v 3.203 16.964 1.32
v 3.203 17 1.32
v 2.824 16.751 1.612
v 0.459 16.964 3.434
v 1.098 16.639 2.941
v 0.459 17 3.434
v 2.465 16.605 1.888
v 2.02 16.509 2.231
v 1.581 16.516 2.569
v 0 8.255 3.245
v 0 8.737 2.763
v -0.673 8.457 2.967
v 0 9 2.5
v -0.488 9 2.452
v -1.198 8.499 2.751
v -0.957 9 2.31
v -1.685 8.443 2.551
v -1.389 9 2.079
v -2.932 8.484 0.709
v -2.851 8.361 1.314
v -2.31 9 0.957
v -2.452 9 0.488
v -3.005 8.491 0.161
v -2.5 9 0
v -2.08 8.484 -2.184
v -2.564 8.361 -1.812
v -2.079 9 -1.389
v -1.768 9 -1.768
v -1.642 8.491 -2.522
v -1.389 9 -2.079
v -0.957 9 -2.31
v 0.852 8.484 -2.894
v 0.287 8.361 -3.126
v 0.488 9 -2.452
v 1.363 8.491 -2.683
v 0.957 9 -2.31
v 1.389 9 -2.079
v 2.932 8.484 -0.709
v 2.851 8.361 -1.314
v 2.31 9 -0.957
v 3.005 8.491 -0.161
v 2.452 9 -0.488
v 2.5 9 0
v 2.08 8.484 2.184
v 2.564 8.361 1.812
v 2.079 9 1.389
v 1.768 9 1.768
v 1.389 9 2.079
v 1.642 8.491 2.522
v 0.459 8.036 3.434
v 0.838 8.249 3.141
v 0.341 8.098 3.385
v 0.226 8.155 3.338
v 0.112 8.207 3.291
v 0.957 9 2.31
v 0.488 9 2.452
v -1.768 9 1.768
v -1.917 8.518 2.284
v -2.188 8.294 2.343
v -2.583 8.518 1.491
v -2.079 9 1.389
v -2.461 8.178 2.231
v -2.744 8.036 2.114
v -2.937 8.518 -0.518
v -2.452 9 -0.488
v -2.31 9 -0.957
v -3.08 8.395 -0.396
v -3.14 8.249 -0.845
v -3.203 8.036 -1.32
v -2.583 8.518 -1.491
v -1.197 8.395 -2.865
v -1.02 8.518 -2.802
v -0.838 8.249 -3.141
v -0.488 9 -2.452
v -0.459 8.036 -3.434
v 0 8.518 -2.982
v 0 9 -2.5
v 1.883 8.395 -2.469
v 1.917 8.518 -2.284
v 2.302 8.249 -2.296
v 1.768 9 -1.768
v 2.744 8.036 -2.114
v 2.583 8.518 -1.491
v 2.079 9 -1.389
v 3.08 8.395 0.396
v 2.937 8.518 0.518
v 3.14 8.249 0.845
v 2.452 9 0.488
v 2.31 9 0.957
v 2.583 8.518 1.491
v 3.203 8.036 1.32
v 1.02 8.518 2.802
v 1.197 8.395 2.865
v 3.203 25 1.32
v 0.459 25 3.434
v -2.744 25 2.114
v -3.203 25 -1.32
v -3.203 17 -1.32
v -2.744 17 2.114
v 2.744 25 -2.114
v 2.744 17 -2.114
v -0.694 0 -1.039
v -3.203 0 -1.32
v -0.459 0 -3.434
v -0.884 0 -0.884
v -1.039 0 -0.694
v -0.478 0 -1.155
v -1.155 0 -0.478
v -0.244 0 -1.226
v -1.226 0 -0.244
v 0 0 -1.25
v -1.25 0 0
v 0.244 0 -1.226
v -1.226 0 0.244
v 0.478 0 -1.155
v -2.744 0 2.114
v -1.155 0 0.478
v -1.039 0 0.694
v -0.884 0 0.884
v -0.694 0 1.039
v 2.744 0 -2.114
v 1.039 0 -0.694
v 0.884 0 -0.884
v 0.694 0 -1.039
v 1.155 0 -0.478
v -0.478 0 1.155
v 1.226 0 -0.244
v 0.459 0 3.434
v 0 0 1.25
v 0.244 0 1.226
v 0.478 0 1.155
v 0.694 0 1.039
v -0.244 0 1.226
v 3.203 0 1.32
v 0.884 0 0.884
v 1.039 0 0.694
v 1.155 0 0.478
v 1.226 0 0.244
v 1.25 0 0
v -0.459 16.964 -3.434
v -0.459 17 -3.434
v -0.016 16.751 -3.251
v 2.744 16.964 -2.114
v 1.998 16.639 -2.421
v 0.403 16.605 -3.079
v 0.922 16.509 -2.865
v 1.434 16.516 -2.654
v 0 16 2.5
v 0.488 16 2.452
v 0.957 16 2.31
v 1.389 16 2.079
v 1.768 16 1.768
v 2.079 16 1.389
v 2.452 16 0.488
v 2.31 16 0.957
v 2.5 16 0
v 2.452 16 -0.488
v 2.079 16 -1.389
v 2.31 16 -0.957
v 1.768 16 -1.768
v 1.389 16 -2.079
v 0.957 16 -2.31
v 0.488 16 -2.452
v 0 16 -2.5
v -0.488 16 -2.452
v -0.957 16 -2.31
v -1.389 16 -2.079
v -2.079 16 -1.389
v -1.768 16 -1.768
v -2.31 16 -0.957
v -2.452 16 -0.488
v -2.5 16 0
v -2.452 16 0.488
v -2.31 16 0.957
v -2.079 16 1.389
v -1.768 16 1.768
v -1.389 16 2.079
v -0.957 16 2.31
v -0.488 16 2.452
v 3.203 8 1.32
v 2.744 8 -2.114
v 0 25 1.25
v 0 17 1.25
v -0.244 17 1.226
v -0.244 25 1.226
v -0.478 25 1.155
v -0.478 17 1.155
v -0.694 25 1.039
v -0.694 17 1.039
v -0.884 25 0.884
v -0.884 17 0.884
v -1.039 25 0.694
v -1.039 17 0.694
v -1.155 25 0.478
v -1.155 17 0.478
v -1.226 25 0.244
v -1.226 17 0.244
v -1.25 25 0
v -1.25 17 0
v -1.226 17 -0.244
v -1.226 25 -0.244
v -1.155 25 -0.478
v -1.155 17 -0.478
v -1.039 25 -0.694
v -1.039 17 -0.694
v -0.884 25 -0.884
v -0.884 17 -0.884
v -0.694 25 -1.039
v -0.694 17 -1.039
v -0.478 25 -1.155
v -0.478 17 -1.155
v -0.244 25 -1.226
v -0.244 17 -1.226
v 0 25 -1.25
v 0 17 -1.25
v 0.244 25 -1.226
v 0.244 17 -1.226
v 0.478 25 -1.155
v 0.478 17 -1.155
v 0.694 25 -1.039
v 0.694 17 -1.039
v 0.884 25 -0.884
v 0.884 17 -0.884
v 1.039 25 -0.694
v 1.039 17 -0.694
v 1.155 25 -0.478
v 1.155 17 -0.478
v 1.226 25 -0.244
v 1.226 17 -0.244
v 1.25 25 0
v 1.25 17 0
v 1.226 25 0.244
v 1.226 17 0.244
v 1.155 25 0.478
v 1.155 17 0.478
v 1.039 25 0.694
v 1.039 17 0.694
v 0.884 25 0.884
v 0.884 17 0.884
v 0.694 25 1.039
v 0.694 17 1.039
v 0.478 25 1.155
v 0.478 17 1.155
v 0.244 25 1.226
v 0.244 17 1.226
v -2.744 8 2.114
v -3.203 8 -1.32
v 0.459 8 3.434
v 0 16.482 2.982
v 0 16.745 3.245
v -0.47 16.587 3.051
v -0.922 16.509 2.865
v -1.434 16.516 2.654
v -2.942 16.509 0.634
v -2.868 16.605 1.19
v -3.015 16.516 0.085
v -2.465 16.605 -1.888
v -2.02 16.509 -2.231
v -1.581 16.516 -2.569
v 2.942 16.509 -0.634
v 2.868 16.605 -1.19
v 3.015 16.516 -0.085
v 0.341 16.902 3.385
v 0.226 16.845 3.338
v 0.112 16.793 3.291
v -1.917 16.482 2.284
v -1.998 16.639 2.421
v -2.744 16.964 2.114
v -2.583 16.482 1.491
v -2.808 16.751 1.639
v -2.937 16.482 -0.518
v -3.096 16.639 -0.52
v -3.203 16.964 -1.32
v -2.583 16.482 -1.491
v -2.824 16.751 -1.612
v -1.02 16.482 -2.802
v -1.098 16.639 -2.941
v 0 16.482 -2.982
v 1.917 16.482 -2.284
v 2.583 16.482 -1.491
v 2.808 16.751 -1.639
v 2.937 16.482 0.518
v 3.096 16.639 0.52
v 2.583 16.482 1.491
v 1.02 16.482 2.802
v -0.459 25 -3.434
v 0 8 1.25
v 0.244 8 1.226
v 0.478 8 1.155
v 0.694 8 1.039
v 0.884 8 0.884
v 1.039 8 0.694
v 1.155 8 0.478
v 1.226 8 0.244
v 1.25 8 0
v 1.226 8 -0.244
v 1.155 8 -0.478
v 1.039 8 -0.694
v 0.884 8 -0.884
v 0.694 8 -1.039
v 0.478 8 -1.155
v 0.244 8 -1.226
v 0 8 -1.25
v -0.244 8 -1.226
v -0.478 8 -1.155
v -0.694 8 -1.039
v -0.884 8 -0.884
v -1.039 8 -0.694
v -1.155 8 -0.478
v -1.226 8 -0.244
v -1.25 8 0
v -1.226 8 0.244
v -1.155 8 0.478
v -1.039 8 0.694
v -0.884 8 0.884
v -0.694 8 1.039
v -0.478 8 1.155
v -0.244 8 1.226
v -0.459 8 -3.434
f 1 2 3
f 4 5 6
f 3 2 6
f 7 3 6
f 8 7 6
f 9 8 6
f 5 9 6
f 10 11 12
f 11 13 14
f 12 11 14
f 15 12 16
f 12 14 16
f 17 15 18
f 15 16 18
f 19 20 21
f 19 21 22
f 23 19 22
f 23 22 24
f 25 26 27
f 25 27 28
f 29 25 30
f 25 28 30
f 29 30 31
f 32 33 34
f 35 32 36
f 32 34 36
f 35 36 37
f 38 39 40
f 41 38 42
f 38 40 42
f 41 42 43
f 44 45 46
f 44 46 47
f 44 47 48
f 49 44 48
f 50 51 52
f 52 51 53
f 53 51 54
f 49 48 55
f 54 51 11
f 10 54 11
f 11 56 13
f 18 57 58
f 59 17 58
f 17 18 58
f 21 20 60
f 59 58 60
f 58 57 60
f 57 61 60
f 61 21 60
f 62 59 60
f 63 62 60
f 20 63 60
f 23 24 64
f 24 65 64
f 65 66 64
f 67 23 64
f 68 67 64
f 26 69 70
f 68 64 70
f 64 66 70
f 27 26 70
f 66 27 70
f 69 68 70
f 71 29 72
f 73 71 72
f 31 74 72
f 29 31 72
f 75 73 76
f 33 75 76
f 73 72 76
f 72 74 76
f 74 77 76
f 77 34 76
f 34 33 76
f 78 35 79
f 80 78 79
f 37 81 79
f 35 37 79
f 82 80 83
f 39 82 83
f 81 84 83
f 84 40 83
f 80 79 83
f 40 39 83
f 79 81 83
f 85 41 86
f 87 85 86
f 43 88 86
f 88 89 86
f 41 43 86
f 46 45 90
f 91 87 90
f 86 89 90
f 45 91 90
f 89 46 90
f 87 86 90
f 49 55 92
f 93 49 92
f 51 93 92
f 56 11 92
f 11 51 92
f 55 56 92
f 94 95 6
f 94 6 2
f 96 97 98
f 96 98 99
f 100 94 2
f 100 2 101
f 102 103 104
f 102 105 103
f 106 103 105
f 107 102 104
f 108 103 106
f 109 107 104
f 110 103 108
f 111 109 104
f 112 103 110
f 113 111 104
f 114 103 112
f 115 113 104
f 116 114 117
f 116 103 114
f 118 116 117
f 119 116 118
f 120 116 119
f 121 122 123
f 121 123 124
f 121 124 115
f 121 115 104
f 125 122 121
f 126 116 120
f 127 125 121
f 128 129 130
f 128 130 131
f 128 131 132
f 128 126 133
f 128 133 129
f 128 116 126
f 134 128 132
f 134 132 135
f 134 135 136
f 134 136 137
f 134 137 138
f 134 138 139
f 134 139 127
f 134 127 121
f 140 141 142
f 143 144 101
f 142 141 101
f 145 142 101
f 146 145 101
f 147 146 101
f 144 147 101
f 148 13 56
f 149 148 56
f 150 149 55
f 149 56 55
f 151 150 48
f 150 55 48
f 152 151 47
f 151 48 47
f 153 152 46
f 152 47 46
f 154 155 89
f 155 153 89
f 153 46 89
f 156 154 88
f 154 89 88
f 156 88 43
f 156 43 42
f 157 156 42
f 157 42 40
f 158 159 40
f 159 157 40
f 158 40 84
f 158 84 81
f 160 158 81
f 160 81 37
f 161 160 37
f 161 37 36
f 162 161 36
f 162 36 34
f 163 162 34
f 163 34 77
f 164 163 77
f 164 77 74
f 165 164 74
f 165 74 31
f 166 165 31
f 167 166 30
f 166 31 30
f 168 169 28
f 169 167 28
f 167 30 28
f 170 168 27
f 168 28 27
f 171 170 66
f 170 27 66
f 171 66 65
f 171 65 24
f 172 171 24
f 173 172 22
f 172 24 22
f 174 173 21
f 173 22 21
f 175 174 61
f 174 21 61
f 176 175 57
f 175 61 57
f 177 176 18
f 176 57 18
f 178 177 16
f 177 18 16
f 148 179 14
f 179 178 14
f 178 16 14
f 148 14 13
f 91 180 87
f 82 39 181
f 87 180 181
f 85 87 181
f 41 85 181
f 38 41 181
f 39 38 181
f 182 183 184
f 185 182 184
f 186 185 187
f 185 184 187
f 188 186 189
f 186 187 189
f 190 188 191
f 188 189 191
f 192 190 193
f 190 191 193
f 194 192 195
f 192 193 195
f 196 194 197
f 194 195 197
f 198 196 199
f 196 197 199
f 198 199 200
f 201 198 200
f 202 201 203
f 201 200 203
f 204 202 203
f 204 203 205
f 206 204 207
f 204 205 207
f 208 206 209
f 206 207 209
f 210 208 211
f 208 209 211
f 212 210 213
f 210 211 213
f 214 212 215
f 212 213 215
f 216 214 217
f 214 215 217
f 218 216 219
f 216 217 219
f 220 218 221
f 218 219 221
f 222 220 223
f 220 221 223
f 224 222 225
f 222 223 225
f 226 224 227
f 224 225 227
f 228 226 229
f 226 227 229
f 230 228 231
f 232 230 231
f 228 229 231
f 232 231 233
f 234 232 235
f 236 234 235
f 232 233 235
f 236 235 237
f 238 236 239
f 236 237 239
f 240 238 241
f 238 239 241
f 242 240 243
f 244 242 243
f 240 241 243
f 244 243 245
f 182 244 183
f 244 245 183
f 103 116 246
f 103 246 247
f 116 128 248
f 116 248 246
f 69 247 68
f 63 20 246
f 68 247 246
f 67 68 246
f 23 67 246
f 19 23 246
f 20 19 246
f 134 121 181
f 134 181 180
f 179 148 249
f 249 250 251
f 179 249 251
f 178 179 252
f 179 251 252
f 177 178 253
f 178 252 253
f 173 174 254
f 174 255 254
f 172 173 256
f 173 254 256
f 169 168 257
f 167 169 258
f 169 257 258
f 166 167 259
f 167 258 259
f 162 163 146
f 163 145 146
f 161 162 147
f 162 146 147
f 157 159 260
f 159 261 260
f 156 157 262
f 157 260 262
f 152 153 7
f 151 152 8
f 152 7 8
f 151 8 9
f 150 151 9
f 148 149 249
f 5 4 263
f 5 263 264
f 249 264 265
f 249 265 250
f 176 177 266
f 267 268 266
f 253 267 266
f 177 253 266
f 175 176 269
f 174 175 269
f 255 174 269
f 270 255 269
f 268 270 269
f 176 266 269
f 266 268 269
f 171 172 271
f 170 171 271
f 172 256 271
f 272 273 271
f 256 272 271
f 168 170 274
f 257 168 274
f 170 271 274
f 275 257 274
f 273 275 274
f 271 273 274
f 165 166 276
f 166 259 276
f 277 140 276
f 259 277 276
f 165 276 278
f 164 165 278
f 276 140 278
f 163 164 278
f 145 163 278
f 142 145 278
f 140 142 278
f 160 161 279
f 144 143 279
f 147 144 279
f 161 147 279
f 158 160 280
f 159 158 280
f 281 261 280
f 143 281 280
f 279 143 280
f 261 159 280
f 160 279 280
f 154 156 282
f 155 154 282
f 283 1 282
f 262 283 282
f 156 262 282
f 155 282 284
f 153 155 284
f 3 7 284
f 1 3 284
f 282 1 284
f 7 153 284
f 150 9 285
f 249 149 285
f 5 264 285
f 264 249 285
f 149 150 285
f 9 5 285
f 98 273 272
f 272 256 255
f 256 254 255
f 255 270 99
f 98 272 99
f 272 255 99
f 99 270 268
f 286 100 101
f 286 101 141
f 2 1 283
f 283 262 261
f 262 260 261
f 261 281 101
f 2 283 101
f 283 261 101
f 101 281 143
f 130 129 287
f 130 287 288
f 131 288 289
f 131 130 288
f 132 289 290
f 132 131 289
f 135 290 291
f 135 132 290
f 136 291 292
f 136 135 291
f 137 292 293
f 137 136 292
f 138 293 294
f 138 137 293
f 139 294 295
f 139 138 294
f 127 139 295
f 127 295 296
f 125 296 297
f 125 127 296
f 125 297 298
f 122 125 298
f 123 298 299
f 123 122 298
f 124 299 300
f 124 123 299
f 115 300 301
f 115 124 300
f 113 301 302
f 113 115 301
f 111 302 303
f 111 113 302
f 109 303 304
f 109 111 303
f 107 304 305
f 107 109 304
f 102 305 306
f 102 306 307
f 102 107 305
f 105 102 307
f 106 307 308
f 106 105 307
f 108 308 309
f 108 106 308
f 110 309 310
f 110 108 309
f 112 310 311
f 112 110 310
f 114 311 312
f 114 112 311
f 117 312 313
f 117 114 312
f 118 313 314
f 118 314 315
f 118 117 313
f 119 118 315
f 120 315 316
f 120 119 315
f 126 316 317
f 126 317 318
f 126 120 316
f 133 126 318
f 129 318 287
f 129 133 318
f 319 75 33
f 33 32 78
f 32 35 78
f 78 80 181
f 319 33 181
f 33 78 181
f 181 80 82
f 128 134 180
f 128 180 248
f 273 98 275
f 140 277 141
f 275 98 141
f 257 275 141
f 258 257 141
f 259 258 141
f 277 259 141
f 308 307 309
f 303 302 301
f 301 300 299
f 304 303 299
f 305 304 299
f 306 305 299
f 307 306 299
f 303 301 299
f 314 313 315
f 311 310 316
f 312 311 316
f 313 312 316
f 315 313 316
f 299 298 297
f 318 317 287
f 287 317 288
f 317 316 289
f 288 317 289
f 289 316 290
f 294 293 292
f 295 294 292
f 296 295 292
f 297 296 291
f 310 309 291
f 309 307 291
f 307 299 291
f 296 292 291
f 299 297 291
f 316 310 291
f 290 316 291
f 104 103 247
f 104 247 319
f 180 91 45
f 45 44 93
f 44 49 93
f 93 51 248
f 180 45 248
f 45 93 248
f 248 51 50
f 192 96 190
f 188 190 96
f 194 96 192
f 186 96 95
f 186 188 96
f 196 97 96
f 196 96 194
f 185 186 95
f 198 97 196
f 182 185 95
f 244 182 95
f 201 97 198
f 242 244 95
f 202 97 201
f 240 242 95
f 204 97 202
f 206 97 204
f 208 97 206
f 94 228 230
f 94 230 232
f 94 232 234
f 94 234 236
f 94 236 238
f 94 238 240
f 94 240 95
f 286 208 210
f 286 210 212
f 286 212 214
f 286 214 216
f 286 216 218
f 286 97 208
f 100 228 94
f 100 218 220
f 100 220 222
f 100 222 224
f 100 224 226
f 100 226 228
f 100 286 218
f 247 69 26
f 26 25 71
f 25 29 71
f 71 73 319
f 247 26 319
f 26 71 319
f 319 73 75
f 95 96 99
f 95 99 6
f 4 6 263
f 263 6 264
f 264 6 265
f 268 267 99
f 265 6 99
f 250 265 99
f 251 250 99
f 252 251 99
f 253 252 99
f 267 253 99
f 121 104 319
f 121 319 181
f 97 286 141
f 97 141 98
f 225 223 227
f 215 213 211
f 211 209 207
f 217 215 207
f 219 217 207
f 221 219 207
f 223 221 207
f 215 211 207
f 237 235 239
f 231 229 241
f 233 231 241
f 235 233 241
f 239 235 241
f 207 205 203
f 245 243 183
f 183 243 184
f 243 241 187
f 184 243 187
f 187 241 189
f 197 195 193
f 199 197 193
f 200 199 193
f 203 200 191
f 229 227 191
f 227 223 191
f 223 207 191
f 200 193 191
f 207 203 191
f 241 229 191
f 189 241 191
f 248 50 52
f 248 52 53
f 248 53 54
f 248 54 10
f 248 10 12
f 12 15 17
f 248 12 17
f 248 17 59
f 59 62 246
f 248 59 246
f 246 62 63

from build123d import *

# Parameters (mm, degrees)
SKETCH_1_R          = 2.5
EXTRUDE_1_DEPTH     = 25
EXTRUDE_2_DEPTH     = 8
EXTRUDE_3_DEPTH     = 8
CHAMFER_1_SIZE      = 1
SKETCH_4_R          = 1.25
CUT_EXTRUDE_1_DEPTH = 8
CUT_EXTRUDE_START   = 8
SKETCH_5_R          = 1.25
CUT_EXTRUDE_2_DEPTH = 8


with BuildPart() as part:
    # 草图1 → 凸台-拉伸1 (new body)
    with BuildSketch(Plane(origin=(0, 0, 0), x_dir=(1, 0, 0), z_dir=(0, 1, 0))):
        with Locations(Location((0, 0, 0), (0, 0, 270))):
            Circle(SKETCH_1_R)
    extrude(amount=EXTRUDE_1_DEPTH)

    # 草图2 → 凸台-拉伸2 (add)
    with BuildSketch(Plane(origin=(0, 25, 0), x_dir=(1, 0, 0), z_dir=(0, 1, 0))):
        Polygon((3.202903935, -1.319623577), (2.744279509, 2.113984385), (-0.458624426, 3.433607962), (-3.202903935, 1.319623577), (-2.744279509, -2.113984385), (0.458624426, -3.433607962), align=None)
    extrude(amount=-EXTRUDE_2_DEPTH)

    # 草图3 → 凸台-拉伸3 (add)
    with BuildSketch(Plane.XZ):
        Polygon((3.202903935, 1.319623577), (0.458624426, 3.433607962), (-2.744279509, 2.113984385), (-3.202903935, -1.319623577), (-0.458624426, -3.433607962), (2.744279509, -2.113984385), align=None)
    extrude(amount=-EXTRUDE_3_DEPTH)

    # 倒角1
    # the kernel refuses this chamfer: 1 mm, written as the material it adds along each edge
    with BuildSketch(Plane(origin=(0, 17, 0), x_dir=(0, 0, 1), z_dir=(1, 0, 0))) as chamfer_1_piece_1_section:
        Polygon((2.5, CHAMFER_1_SIZE), (2.5 + CHAMFER_1_SIZE, 0), (2.5, 0), align=None)
    chamfer_1_piece_1 = revolve(axis=Axis((0, 17, 0), (0, -1, 0)), mode=Mode.PRIVATE)
    chamfer_1_piece_1 = split(chamfer_1_piece_1, bisect_by=Plane(origin=(2.585980682, 16.482096178, -3.299128656), z_dir=(-0.9911972405355005, 0, 0.13239346794615373)), keep=Keep.TOP, mode=Mode.PRIVATE)
    chamfer_1_piece_1 = split(chamfer_1_piece_1, bisect_by=Plane(origin=(3.258731824, 16.482096178, 1.276618014), z_dir=(-0.61025472680424, 0, -0.7922052564917015)), keep=Keep.TOP, mode=Mode.PRIVATE)
    chamfer_1_piece_1 = split(chamfer_1_piece_1, bisect_by=Plane(origin=(0.102470937, 16.482096178, -3.202431915), z_dir=(-0.3809425137312606, 0, 0.924598724437855)), keep=Keep.TOP, mode=Mode.PRIVATE)
    chamfer_1_piece_1 = split(chamfer_1_piece_1, bisect_by=Plane(origin=(-2.183184145, 16.482096178, 2.345160432), z_dir=(0.38094251373126053, 0, -0.924598724437855)), keep=Keep.TOP, mode=Mode.PRIVATE)
    chamfer_1_piece_1 = split(chamfer_1_piece_1, bisect_by=Plane(origin=(-0.402796537, 16.482096178, -3.476613525), z_dir=(0.6102547268042401, 0, 0.7922052564917015)), keep=Keep.TOP, mode=Mode.PRIVATE)
    chamfer_1_piece_1 = split(chamfer_1_piece_1, bisect_by=Plane(origin=(-3.361202761, 16.482096178, -2.504767848), z_dir=(0.9911972405355005, 0, -0.1323934679461537)), keep=Keep.TOP, mode=Mode.PRIVATE)
    add(chamfer_1_piece_1)
    with BuildSketch(Plane(origin=(0, 8, 0), x_dir=(0, 0, 1), z_dir=(1, 0, 0))) as chamfer_1_piece_2_section:
        Polygon((2.5 + CHAMFER_1_SIZE, 0), (2.5, -CHAMFER_1_SIZE), (2.5, 0), align=None)
    chamfer_1_piece_2 = revolve(axis=Axis((0, 8, 0), (0, -1, 0)), mode=Mode.PRIVATE)
    chamfer_1_piece_2 = split(chamfer_1_piece_2, bisect_by=Plane(origin=(3.258731824, 8.517903822, 1.276618014), z_dir=(-0.61025472680424, 0, -0.7922052564917015)), keep=Keep.TOP, mode=Mode.PRIVATE)
    chamfer_1_piece_2 = split(chamfer_1_piece_2, bisect_by=Plane(origin=(2.585980682, 8.517903822, -3.299128656), z_dir=(-0.9911972405355005, 0, 0.13239346794615373)), keep=Keep.TOP, mode=Mode.PRIVATE)
    chamfer_1_piece_2 = split(chamfer_1_piece_2, bisect_by=Plane(origin=(-2.183184145, 8.517903822, 2.345160432), z_dir=(0.38094251373126053, 0, -0.924598724437855)), keep=Keep.TOP, mode=Mode.PRIVATE)
    chamfer_1_piece_2 = split(chamfer_1_piece_2, bisect_by=Plane(origin=(0.102470937, 8.517903822, -3.202431915), z_dir=(-0.3809425137312606, 0, 0.924598724437855)), keep=Keep.TOP, mode=Mode.PRIVATE)
    chamfer_1_piece_2 = split(chamfer_1_piece_2, bisect_by=Plane(origin=(-3.361202761, 8.517903822, -2.504767848), z_dir=(0.9911972405355005, 0, -0.1323934679461537)), keep=Keep.TOP, mode=Mode.PRIVATE)
    chamfer_1_piece_2 = split(chamfer_1_piece_2, bisect_by=Plane(origin=(-0.402796537, 8.517903822, -3.476613525), z_dir=(0.6102547268042401, 0, 0.7922052564917015)), keep=Keep.TOP, mode=Mode.PRIVATE)
    add(chamfer_1_piece_2)

    # 草图4 → 切除-拉伸1 (cut)
    with BuildSketch(Plane(origin=(0, 0, 0), x_dir=(-1, 0, 0), z_dir=(0, 1, 0))):
        with Locations(Location((0, 0, 0), (0, 0, 90))):
            Circle(SKETCH_4_R)
    extrude(amount=CUT_EXTRUDE_1_DEPTH, mode=Mode.SUBTRACT)

    # 草图5 → 切除-拉伸2 (cut)
    with BuildSketch(Plane(origin=(0, 25, 0), x_dir=(-1, 0, 0), z_dir=(0, -1, 0)).offset(CUT_EXTRUDE_START)):
        with Locations(Location((0, 0, 0), (0, 0, 270))):
            Circle(SKETCH_5_R)
    extrude(amount=-CUT_EXTRUDE_2_DEPTH, mode=Mode.SUBTRACT)


solid = part.part
